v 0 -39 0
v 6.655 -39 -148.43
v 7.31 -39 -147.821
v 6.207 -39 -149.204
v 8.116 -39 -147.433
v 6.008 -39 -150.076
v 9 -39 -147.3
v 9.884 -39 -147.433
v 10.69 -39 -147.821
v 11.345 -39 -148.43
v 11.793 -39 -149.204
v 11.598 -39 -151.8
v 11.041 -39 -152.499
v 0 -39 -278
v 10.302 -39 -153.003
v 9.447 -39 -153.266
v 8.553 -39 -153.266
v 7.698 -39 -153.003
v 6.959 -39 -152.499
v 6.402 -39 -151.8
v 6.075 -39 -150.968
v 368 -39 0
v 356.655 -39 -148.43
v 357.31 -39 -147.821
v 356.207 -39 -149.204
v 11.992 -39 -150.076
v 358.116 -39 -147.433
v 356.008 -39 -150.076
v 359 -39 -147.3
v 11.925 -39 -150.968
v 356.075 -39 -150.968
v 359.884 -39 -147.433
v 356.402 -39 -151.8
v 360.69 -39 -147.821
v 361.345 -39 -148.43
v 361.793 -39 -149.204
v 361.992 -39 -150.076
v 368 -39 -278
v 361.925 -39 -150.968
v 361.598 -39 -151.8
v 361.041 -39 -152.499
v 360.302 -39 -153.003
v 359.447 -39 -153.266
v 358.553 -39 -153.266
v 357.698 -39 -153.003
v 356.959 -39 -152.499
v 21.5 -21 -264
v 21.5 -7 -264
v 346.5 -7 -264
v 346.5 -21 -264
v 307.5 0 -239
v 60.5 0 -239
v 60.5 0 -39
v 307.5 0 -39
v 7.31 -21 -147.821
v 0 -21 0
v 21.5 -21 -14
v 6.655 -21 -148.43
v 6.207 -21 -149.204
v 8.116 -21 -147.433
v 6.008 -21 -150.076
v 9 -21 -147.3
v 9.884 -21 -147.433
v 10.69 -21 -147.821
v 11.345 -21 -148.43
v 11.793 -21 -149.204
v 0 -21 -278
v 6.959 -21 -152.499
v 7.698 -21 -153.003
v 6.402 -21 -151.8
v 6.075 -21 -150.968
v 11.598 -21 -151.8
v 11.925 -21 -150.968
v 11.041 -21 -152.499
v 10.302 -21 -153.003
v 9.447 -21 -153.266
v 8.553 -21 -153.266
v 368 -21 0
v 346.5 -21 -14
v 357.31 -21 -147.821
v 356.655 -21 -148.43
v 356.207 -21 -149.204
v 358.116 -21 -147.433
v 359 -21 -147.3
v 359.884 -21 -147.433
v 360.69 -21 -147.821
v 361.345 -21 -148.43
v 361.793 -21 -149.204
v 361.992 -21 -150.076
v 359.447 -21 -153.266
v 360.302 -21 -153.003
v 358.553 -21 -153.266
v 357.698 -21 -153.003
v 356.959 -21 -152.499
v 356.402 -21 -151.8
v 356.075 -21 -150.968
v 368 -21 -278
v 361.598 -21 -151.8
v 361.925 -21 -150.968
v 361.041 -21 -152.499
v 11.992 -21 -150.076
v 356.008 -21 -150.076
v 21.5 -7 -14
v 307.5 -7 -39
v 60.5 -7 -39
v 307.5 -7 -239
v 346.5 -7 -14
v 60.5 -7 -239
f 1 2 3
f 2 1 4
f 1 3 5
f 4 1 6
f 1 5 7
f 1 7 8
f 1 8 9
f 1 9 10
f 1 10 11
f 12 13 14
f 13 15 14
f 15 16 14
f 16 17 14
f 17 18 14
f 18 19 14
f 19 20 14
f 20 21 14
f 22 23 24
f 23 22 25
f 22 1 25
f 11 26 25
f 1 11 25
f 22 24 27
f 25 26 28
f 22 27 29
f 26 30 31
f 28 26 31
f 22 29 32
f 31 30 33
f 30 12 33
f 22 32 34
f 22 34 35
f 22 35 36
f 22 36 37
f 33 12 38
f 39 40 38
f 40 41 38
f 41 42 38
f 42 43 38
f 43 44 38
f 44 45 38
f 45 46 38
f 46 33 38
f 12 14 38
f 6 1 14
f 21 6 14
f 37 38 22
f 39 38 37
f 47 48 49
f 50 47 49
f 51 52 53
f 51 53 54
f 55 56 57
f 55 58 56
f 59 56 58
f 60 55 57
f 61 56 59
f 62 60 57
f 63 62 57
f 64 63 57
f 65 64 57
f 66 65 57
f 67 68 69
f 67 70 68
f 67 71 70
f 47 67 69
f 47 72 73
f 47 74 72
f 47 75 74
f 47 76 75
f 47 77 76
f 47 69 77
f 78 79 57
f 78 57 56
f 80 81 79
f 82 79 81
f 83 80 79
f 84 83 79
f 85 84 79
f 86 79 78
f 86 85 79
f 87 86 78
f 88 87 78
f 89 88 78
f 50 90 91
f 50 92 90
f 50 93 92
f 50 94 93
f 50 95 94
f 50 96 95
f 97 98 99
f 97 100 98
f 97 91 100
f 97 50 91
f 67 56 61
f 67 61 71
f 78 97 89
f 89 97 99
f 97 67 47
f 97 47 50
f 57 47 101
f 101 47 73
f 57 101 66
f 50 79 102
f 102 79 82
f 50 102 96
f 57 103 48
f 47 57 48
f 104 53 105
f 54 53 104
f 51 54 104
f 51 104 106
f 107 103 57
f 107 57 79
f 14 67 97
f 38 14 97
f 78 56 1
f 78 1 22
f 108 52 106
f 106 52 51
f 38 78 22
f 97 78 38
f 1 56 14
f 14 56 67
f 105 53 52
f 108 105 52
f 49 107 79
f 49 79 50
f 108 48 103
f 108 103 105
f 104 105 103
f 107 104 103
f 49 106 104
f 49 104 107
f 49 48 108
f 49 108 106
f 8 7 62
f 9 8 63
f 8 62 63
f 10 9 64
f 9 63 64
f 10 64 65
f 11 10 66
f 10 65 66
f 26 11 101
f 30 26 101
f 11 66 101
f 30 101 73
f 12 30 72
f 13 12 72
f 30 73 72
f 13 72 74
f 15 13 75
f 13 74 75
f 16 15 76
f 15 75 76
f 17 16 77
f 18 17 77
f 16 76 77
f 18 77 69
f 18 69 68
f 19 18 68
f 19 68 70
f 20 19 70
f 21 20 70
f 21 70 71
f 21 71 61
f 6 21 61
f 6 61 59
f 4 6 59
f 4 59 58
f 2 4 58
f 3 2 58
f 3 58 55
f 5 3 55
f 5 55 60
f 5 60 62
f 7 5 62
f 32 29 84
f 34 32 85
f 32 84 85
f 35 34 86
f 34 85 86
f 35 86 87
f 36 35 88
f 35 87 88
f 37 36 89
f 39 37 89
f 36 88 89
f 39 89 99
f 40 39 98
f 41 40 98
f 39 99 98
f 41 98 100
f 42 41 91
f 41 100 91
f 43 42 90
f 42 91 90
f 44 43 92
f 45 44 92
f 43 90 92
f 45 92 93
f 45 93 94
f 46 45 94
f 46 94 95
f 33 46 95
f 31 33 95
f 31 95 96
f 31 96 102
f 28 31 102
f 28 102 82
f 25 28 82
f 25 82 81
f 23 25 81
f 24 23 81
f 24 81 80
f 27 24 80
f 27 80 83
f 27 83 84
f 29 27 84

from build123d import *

# Parameters (mm, degrees)
SKETCH1_W           = 368
SKETCH1_H           = 278
BOSS_EXTRUDE1_DEPTH = 39
SKETCH2_W           = 368
SKETCH2_H           = 278
SKETCH2_W_2         = 325
SKETCH2_H_2         = 250
CUT_EXTRUDE1_DEPTH  = 21
SKETCH3_W           = 325
SKETCH3_H           = 250
SKETCH3_W_2         = 247
SKETCH3_H_2         = 200
CUT_EXTRUDE2_DEPTH  = 7
SKETCH4_R           = 3
CUT_EXTRUDE3_DEPTH  = 59


with BuildPart() as part:
    # Sketch1 → Boss-Extrude1 (new body)
    with BuildSketch(Plane(origin=(0, 0, 0), x_dir=(1, 0, 0), z_dir=(0, 1, 0))):
        with Locations((184, 139)):
            Rectangle(SKETCH1_W, SKETCH1_H)
    extrude(amount=-BOSS_EXTRUDE1_DEPTH)

    # Sketch2 → Cut-Extrude1 (cut)
    with BuildSketch(Plane(origin=(0, 0, 0), x_dir=(1, 0, 0), z_dir=(0, 1, 0))):
        with Locations((184, 139)):
            Rectangle(SKETCH2_W, SKETCH2_H)
        with Locations((184, 139)):
            Rectangle(SKETCH2_W_2, SKETCH2_H_2, mode=Mode.SUBTRACT)
    extrude(amount=-CUT_EXTRUDE1_DEPTH, mode=Mode.SUBTRACT)

    # Sketch3 → Cut-Extrude2 (cut)
    with BuildSketch(Plane(origin=(0, 0, 0), x_dir=(1, 0, 0), z_dir=(0, 1, 0))):
        with Locations((184, 139)):
            Rectangle(SKETCH3_W, SKETCH3_H)
        with Locations((184, 139)):
            Rectangle(SKETCH3_W_2, SKETCH3_H_2, mode=Mode.SUBTRACT)
    extrude(amount=-CUT_EXTRUDE2_DEPTH, mode=Mode.SUBTRACT)

    # Sketch4 → Cut-Extrude3 (cut)
    with BuildSketch(Plane(origin=(0, 0, 0), x_dir=(1, 0, 0), z_dir=(0, 1, 0))):
        with Locations(Location((9, 150.3, 0), (0, 0, 270))):
            Circle(SKETCH4_R)
        with Locations(Location((359, 150.3, 0), (0, 0, 270))):
            Circle(SKETCH4_R)
    extrude(amount=-CUT_EXTRUDE3_DEPTH, mode=Mode.SUBTRACT)


solid = part.part
